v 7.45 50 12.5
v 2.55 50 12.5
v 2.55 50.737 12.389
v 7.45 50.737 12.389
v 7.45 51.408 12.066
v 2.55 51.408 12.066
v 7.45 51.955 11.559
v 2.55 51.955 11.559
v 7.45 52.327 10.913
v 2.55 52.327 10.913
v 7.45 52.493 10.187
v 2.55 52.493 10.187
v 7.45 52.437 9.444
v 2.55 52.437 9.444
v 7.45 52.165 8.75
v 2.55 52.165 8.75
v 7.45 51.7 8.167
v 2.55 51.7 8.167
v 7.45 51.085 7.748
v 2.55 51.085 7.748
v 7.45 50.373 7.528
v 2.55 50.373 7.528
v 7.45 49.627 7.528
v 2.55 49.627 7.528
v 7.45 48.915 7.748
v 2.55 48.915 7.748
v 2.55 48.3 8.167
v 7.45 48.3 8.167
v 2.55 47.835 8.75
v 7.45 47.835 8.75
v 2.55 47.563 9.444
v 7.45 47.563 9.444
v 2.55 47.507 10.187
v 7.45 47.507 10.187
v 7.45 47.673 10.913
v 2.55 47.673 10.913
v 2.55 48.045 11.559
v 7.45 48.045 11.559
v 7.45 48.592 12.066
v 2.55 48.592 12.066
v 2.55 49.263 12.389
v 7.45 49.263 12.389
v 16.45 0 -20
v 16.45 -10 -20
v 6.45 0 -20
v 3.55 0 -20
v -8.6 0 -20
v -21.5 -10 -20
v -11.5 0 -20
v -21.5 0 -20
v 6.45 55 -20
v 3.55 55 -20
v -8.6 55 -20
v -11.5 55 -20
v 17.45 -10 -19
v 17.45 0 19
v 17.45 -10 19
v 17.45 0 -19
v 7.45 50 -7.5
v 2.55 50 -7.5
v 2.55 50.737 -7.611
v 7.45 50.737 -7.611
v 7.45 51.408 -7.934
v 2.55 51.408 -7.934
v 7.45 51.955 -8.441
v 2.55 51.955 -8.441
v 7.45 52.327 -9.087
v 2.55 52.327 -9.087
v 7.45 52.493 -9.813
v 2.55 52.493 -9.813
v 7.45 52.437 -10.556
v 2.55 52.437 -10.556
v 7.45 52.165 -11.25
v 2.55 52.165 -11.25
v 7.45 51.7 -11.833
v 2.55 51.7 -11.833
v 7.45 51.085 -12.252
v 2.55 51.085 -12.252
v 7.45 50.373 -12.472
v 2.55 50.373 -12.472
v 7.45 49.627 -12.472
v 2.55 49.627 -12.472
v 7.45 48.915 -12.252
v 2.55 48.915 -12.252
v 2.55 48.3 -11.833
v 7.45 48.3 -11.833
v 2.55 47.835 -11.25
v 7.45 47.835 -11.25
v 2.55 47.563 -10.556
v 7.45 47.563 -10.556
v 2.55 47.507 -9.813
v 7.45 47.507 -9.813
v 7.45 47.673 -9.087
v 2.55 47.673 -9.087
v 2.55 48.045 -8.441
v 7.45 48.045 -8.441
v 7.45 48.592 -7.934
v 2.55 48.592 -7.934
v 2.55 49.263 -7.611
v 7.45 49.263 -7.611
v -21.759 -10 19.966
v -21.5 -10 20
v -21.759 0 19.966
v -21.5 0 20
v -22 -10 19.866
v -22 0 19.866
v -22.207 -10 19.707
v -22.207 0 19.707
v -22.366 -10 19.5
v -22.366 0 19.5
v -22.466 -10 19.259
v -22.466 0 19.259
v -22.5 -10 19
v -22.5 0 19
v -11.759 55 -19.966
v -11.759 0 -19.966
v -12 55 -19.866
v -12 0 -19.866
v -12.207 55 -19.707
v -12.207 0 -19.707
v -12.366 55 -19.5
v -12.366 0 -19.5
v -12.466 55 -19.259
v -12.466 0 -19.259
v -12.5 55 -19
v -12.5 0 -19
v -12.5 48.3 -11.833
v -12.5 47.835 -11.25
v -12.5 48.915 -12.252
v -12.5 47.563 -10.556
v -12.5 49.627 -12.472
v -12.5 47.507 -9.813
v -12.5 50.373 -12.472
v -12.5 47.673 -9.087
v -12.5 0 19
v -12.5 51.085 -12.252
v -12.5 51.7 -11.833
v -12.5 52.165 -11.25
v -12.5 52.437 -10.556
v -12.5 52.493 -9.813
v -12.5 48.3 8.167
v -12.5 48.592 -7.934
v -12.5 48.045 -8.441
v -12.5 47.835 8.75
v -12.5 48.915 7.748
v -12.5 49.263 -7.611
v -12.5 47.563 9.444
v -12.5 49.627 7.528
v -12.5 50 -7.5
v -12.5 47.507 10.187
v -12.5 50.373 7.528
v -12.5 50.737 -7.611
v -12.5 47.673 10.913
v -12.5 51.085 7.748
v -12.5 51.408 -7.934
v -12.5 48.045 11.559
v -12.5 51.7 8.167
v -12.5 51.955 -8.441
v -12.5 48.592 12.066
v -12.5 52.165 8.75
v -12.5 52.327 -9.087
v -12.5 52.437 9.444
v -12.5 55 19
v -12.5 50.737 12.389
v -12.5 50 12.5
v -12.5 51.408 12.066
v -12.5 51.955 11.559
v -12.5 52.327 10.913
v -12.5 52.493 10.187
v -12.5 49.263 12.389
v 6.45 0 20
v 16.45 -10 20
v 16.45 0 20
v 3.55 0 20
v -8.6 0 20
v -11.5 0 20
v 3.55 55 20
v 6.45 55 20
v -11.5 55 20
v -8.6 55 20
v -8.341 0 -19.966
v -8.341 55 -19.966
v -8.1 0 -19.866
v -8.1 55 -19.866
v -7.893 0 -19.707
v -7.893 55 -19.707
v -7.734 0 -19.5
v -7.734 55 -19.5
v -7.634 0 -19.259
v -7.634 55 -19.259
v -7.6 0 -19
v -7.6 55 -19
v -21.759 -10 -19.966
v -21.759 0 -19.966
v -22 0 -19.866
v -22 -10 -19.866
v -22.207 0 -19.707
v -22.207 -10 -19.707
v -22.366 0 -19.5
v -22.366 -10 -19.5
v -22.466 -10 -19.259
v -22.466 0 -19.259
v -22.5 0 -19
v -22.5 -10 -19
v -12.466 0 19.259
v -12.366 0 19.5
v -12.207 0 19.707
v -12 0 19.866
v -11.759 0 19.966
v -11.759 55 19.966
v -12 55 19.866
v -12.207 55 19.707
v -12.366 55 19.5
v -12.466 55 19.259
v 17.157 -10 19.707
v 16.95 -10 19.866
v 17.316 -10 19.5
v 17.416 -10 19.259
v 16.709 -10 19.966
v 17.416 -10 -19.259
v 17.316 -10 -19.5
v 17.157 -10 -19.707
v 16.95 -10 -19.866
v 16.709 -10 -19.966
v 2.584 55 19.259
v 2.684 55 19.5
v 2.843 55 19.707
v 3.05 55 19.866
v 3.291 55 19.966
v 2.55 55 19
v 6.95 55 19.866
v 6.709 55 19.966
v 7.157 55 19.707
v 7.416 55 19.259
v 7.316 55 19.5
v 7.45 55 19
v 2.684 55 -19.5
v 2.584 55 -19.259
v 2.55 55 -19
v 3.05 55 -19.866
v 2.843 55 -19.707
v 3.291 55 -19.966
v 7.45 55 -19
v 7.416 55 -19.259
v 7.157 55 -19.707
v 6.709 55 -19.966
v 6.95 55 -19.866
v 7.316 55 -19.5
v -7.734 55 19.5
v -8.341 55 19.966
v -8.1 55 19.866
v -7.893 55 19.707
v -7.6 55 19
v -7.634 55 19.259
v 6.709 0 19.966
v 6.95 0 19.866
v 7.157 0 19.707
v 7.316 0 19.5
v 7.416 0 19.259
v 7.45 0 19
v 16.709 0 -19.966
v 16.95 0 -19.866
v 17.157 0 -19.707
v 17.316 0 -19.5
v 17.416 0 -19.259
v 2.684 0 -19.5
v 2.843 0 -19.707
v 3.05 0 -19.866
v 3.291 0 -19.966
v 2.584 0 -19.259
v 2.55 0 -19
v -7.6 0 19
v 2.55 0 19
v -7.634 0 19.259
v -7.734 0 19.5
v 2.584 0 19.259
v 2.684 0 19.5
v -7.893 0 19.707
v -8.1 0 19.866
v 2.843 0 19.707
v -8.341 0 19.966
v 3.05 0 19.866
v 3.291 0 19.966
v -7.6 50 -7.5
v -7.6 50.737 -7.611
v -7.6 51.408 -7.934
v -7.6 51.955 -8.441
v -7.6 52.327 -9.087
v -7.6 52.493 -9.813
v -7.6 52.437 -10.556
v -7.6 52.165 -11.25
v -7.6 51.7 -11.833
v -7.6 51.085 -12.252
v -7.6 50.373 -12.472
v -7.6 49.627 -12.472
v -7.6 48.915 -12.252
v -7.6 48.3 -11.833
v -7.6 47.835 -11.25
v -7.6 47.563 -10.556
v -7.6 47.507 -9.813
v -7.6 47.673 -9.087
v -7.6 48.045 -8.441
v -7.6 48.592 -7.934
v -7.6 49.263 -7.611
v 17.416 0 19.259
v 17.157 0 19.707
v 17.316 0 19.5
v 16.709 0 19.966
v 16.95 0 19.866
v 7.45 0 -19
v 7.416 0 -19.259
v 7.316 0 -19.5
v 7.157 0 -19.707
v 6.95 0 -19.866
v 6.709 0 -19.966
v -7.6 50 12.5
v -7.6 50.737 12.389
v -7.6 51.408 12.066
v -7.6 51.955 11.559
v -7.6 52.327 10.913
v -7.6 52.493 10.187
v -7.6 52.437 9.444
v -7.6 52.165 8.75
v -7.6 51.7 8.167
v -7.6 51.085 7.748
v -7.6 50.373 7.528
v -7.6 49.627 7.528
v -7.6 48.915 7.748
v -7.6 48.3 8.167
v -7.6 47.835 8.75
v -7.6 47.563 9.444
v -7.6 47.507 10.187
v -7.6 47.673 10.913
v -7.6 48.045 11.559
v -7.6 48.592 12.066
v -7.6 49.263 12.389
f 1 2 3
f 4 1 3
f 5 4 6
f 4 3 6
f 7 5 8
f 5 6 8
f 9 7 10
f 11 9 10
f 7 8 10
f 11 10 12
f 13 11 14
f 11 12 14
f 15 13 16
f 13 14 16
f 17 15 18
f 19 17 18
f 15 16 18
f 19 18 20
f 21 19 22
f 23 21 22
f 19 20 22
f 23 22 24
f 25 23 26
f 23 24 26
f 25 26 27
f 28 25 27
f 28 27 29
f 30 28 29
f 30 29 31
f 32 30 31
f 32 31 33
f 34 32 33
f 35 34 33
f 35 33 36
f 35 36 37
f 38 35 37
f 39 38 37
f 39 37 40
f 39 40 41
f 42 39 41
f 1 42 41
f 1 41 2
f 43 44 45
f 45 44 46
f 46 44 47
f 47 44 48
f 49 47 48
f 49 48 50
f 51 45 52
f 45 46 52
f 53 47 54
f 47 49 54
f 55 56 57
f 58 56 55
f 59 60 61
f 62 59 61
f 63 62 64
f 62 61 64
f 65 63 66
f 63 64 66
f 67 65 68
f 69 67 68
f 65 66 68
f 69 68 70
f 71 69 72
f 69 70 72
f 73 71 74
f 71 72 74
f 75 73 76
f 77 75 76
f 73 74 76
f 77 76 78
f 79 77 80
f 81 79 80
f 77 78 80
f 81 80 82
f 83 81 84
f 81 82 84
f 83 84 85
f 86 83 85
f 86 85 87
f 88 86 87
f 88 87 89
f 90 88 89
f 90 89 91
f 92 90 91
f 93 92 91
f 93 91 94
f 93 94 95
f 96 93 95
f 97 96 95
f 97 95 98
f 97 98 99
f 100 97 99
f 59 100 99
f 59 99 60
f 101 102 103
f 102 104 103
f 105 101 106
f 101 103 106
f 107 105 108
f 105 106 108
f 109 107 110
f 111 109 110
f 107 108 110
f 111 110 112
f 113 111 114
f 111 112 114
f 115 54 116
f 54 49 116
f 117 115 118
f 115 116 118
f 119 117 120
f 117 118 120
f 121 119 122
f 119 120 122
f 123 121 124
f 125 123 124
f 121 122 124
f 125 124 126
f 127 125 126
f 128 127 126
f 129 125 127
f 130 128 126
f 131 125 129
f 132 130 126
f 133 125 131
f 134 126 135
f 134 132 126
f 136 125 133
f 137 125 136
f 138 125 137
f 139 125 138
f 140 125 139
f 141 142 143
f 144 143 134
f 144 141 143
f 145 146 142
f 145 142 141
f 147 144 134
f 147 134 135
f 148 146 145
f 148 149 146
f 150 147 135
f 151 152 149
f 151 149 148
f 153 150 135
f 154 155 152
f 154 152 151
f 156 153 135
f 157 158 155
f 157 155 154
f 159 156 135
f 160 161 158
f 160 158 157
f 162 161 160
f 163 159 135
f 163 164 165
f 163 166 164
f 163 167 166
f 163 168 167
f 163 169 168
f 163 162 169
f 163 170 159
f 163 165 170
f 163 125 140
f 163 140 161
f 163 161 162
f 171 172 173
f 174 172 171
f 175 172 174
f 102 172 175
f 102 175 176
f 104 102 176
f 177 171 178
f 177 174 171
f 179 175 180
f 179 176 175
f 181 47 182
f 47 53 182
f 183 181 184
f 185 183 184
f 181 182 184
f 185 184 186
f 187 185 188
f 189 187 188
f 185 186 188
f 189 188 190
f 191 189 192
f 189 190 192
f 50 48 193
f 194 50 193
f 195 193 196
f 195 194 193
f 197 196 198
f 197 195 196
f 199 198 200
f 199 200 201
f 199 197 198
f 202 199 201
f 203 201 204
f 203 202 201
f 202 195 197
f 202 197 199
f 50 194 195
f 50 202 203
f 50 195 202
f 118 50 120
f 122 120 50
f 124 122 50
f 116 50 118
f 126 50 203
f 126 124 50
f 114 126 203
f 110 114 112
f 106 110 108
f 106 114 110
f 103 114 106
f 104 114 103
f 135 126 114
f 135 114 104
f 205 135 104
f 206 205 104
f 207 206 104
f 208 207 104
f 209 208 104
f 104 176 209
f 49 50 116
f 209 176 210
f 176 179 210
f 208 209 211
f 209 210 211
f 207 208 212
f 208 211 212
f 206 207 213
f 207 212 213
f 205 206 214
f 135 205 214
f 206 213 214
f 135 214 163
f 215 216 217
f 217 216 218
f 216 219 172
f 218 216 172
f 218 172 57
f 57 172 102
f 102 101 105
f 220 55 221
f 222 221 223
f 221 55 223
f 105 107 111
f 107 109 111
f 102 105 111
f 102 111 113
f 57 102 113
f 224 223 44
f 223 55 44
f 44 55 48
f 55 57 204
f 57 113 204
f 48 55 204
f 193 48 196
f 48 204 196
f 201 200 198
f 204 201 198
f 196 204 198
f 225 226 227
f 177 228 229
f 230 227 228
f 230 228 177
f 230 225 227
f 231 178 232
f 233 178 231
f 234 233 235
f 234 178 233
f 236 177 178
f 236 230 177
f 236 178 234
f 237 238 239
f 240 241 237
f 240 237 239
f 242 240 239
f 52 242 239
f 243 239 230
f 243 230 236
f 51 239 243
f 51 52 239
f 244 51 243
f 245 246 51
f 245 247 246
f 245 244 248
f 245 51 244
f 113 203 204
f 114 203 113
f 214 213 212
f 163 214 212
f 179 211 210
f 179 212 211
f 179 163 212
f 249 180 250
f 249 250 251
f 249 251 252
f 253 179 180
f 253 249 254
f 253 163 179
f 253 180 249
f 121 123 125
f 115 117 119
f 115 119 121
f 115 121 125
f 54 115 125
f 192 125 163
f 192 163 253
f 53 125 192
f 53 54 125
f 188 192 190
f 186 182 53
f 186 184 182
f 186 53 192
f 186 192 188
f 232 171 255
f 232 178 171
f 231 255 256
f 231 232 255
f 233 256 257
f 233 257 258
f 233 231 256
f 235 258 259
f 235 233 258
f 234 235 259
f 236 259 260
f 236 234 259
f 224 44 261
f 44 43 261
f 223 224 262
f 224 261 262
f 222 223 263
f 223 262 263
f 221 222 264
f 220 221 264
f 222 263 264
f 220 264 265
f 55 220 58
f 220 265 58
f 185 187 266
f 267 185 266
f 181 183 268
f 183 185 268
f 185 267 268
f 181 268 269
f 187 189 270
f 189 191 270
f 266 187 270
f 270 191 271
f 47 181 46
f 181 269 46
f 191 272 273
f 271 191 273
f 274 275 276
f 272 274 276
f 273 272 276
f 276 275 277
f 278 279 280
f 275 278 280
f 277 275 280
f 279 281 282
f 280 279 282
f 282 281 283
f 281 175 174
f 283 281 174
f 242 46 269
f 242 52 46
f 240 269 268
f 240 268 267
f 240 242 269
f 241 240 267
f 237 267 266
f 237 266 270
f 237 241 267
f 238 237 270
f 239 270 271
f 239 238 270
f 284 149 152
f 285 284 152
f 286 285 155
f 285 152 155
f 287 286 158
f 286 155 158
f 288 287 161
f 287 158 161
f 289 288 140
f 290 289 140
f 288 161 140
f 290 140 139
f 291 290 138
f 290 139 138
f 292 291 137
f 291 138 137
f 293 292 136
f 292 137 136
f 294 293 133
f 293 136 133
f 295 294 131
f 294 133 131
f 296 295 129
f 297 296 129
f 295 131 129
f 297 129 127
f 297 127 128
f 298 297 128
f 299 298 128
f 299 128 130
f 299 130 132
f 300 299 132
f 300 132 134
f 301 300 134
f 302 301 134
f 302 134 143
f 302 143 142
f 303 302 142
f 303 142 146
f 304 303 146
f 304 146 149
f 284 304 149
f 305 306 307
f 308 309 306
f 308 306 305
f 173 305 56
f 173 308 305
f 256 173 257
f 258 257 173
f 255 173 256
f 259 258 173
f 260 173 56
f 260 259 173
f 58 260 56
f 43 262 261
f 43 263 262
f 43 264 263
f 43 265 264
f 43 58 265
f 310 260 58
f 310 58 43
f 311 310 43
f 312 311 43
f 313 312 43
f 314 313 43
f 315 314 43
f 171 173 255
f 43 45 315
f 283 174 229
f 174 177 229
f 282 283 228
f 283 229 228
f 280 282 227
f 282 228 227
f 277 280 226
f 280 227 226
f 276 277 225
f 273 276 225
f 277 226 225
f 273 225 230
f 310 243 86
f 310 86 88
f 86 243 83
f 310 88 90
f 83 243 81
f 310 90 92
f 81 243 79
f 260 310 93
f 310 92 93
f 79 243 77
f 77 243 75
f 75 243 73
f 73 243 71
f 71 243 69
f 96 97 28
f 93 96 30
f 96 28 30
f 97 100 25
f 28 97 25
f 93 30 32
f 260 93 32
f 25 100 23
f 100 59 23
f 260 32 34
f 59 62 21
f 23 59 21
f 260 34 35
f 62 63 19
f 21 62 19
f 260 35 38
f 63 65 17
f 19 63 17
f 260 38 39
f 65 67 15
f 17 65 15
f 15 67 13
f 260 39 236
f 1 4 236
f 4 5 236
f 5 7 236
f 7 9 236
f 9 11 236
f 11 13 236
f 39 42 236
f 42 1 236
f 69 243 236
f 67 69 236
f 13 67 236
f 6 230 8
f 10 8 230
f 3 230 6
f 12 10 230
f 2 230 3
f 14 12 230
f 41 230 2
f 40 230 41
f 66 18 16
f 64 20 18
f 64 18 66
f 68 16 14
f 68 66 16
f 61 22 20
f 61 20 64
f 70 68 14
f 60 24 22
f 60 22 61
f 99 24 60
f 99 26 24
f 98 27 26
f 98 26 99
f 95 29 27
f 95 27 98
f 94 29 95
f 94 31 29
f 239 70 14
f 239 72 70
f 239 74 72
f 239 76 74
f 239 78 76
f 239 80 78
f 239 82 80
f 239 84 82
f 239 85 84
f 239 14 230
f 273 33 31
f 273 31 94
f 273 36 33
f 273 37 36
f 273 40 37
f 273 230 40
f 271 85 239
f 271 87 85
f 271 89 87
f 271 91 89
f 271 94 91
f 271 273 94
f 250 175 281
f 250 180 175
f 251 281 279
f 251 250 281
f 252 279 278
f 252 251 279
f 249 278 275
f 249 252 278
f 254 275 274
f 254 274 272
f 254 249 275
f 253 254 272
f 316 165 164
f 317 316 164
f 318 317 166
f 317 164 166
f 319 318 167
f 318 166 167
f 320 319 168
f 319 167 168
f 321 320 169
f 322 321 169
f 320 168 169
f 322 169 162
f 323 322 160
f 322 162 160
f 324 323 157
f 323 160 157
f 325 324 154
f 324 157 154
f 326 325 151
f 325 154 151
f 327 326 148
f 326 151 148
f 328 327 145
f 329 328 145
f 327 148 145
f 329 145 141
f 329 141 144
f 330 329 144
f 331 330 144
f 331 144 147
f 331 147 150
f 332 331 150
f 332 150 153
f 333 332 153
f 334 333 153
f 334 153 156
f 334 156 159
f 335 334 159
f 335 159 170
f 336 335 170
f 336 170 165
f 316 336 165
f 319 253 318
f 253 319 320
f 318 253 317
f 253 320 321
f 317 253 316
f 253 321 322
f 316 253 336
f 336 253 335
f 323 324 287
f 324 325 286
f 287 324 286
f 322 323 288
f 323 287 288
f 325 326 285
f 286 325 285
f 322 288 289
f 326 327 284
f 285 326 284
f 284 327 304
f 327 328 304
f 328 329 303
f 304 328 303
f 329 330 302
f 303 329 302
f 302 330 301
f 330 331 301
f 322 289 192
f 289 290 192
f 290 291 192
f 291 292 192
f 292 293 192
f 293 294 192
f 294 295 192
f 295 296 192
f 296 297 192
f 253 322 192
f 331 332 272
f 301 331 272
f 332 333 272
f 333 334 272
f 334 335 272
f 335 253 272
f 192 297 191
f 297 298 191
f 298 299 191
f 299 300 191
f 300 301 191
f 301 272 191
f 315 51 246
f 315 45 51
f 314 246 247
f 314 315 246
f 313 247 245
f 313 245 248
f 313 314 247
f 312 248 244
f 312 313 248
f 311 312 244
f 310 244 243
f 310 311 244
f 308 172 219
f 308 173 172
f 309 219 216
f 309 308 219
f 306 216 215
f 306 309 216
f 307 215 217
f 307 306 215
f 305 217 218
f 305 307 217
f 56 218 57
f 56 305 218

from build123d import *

# Parameters (mm, degrees)
SKETCH1_W             = 4.9
SKETCH1_H             = 40
BOSS_EXTRUDE1_DEPTH   = 55
BOSS_EXTRUDE1_2_DEPTH = 55
SKETCH2_W             = 19.95
SKETCH2_H             = 40
BOSS_EXTRUDE2_DEPTH   = 10
SKETCH3_R             = 2.5
CUT_EXTRUDE1_DEPTH    = 19.95
SKETCH5_W             = 40
SKETCH5_H             = 10
BOSS_EXTRUDE4_DEPTH   = 10
SKETCH6_W             = 40
SKETCH6_H             = 10
BOSS_EXTRUDE5_DEPTH   = 10
FILLET1_R             = 1


with BuildPart() as part:
    # Sketch1 → Boss-Extrude1 (new body)
    with BuildSketch(Plane(origin=(0, 0, 0), x_dir=(1, 0, 0), z_dir=(0, 1, 0))):
        with Locations((-10.05, 0)):
            Rectangle(SKETCH1_W, SKETCH1_H)
    extrude(amount=BOSS_EXTRUDE1_DEPTH)



with BuildPart() as body_2:
    # Sketch1 → Boss-Extrude1 2 (new body)
    with BuildSketch(Plane(origin=(0, 0, 0), x_dir=(1, 0, 0), z_dir=(0, 1, 0))):
        with Locations((5, 0)):
            Rectangle(SKETCH1_W, SKETCH1_H)
    extrude(amount=BOSS_EXTRUDE1_2_DEPTH)


with BuildPart() as part_1:
    add(part.part)

    add(body_2.part)  # Boss-Extrude2 merges body 2
    # Sketch2 → Boss-Extrude2 (add)
    with BuildSketch(Plane.XZ):
        with Locations((-2.525, 0)):
            Rectangle(SKETCH2_W, SKETCH2_H)
    extrude(amount=BOSS_EXTRUDE2_DEPTH)

    # Sketch3 → Cut-Extrude1 (cut)
    with BuildSketch(Plane.ZY.offset(12.5)):
        with Locations((-10, 50)):
            Circle(SKETCH3_R)
        with Locations((10, 50)):
            Circle(SKETCH3_R)
    extrude(amount=-CUT_EXTRUDE1_DEPTH, mode=Mode.SUBTRACT)

    # Sketch5 → Boss-Extrude4 (add)
    with BuildSketch(Plane.ZY.offset(12.5)):
        with Locations((0, -5)):
            Rectangle(SKETCH5_W, SKETCH5_H)
    extrude(amount=BOSS_EXTRUDE4_DEPTH)

    # Sketch6 → Boss-Extrude5 (add)
    with BuildSketch(Plane(origin=(7.45, 0, 0), x_dir=(0, 0, -1), z_dir=(1, 0, 0))):
        with Locations((0, -5)):
            Rectangle(SKETCH6_W, SKETCH6_H)
    extrude(amount=BOSS_EXTRUDE5_DEPTH)

    # Fillet1
    fillet1_edges = [part_1.edges().sort_by_distance(p)[0] for p in [
        (2.55, 27.5, -20),
        (2.55, 27.5, 20),
        (-22.5, -5, -20),
        (-22.5, -5, 20),
        (-12.5, 27.5, -20),
        (7.45, 27.5, -20),
        (7.45, 27.5, 20),
        (-7.6, 27.5, -20),
        (-7.6, 27.5, 20),
        (17.45, -5, 20),
        (-12.5, 27.5, 20),
        (17.45, -5, -20),
    ]]
    fillet(fillet1_edges, radius=FILLET1_R)


solid = part_1.part
